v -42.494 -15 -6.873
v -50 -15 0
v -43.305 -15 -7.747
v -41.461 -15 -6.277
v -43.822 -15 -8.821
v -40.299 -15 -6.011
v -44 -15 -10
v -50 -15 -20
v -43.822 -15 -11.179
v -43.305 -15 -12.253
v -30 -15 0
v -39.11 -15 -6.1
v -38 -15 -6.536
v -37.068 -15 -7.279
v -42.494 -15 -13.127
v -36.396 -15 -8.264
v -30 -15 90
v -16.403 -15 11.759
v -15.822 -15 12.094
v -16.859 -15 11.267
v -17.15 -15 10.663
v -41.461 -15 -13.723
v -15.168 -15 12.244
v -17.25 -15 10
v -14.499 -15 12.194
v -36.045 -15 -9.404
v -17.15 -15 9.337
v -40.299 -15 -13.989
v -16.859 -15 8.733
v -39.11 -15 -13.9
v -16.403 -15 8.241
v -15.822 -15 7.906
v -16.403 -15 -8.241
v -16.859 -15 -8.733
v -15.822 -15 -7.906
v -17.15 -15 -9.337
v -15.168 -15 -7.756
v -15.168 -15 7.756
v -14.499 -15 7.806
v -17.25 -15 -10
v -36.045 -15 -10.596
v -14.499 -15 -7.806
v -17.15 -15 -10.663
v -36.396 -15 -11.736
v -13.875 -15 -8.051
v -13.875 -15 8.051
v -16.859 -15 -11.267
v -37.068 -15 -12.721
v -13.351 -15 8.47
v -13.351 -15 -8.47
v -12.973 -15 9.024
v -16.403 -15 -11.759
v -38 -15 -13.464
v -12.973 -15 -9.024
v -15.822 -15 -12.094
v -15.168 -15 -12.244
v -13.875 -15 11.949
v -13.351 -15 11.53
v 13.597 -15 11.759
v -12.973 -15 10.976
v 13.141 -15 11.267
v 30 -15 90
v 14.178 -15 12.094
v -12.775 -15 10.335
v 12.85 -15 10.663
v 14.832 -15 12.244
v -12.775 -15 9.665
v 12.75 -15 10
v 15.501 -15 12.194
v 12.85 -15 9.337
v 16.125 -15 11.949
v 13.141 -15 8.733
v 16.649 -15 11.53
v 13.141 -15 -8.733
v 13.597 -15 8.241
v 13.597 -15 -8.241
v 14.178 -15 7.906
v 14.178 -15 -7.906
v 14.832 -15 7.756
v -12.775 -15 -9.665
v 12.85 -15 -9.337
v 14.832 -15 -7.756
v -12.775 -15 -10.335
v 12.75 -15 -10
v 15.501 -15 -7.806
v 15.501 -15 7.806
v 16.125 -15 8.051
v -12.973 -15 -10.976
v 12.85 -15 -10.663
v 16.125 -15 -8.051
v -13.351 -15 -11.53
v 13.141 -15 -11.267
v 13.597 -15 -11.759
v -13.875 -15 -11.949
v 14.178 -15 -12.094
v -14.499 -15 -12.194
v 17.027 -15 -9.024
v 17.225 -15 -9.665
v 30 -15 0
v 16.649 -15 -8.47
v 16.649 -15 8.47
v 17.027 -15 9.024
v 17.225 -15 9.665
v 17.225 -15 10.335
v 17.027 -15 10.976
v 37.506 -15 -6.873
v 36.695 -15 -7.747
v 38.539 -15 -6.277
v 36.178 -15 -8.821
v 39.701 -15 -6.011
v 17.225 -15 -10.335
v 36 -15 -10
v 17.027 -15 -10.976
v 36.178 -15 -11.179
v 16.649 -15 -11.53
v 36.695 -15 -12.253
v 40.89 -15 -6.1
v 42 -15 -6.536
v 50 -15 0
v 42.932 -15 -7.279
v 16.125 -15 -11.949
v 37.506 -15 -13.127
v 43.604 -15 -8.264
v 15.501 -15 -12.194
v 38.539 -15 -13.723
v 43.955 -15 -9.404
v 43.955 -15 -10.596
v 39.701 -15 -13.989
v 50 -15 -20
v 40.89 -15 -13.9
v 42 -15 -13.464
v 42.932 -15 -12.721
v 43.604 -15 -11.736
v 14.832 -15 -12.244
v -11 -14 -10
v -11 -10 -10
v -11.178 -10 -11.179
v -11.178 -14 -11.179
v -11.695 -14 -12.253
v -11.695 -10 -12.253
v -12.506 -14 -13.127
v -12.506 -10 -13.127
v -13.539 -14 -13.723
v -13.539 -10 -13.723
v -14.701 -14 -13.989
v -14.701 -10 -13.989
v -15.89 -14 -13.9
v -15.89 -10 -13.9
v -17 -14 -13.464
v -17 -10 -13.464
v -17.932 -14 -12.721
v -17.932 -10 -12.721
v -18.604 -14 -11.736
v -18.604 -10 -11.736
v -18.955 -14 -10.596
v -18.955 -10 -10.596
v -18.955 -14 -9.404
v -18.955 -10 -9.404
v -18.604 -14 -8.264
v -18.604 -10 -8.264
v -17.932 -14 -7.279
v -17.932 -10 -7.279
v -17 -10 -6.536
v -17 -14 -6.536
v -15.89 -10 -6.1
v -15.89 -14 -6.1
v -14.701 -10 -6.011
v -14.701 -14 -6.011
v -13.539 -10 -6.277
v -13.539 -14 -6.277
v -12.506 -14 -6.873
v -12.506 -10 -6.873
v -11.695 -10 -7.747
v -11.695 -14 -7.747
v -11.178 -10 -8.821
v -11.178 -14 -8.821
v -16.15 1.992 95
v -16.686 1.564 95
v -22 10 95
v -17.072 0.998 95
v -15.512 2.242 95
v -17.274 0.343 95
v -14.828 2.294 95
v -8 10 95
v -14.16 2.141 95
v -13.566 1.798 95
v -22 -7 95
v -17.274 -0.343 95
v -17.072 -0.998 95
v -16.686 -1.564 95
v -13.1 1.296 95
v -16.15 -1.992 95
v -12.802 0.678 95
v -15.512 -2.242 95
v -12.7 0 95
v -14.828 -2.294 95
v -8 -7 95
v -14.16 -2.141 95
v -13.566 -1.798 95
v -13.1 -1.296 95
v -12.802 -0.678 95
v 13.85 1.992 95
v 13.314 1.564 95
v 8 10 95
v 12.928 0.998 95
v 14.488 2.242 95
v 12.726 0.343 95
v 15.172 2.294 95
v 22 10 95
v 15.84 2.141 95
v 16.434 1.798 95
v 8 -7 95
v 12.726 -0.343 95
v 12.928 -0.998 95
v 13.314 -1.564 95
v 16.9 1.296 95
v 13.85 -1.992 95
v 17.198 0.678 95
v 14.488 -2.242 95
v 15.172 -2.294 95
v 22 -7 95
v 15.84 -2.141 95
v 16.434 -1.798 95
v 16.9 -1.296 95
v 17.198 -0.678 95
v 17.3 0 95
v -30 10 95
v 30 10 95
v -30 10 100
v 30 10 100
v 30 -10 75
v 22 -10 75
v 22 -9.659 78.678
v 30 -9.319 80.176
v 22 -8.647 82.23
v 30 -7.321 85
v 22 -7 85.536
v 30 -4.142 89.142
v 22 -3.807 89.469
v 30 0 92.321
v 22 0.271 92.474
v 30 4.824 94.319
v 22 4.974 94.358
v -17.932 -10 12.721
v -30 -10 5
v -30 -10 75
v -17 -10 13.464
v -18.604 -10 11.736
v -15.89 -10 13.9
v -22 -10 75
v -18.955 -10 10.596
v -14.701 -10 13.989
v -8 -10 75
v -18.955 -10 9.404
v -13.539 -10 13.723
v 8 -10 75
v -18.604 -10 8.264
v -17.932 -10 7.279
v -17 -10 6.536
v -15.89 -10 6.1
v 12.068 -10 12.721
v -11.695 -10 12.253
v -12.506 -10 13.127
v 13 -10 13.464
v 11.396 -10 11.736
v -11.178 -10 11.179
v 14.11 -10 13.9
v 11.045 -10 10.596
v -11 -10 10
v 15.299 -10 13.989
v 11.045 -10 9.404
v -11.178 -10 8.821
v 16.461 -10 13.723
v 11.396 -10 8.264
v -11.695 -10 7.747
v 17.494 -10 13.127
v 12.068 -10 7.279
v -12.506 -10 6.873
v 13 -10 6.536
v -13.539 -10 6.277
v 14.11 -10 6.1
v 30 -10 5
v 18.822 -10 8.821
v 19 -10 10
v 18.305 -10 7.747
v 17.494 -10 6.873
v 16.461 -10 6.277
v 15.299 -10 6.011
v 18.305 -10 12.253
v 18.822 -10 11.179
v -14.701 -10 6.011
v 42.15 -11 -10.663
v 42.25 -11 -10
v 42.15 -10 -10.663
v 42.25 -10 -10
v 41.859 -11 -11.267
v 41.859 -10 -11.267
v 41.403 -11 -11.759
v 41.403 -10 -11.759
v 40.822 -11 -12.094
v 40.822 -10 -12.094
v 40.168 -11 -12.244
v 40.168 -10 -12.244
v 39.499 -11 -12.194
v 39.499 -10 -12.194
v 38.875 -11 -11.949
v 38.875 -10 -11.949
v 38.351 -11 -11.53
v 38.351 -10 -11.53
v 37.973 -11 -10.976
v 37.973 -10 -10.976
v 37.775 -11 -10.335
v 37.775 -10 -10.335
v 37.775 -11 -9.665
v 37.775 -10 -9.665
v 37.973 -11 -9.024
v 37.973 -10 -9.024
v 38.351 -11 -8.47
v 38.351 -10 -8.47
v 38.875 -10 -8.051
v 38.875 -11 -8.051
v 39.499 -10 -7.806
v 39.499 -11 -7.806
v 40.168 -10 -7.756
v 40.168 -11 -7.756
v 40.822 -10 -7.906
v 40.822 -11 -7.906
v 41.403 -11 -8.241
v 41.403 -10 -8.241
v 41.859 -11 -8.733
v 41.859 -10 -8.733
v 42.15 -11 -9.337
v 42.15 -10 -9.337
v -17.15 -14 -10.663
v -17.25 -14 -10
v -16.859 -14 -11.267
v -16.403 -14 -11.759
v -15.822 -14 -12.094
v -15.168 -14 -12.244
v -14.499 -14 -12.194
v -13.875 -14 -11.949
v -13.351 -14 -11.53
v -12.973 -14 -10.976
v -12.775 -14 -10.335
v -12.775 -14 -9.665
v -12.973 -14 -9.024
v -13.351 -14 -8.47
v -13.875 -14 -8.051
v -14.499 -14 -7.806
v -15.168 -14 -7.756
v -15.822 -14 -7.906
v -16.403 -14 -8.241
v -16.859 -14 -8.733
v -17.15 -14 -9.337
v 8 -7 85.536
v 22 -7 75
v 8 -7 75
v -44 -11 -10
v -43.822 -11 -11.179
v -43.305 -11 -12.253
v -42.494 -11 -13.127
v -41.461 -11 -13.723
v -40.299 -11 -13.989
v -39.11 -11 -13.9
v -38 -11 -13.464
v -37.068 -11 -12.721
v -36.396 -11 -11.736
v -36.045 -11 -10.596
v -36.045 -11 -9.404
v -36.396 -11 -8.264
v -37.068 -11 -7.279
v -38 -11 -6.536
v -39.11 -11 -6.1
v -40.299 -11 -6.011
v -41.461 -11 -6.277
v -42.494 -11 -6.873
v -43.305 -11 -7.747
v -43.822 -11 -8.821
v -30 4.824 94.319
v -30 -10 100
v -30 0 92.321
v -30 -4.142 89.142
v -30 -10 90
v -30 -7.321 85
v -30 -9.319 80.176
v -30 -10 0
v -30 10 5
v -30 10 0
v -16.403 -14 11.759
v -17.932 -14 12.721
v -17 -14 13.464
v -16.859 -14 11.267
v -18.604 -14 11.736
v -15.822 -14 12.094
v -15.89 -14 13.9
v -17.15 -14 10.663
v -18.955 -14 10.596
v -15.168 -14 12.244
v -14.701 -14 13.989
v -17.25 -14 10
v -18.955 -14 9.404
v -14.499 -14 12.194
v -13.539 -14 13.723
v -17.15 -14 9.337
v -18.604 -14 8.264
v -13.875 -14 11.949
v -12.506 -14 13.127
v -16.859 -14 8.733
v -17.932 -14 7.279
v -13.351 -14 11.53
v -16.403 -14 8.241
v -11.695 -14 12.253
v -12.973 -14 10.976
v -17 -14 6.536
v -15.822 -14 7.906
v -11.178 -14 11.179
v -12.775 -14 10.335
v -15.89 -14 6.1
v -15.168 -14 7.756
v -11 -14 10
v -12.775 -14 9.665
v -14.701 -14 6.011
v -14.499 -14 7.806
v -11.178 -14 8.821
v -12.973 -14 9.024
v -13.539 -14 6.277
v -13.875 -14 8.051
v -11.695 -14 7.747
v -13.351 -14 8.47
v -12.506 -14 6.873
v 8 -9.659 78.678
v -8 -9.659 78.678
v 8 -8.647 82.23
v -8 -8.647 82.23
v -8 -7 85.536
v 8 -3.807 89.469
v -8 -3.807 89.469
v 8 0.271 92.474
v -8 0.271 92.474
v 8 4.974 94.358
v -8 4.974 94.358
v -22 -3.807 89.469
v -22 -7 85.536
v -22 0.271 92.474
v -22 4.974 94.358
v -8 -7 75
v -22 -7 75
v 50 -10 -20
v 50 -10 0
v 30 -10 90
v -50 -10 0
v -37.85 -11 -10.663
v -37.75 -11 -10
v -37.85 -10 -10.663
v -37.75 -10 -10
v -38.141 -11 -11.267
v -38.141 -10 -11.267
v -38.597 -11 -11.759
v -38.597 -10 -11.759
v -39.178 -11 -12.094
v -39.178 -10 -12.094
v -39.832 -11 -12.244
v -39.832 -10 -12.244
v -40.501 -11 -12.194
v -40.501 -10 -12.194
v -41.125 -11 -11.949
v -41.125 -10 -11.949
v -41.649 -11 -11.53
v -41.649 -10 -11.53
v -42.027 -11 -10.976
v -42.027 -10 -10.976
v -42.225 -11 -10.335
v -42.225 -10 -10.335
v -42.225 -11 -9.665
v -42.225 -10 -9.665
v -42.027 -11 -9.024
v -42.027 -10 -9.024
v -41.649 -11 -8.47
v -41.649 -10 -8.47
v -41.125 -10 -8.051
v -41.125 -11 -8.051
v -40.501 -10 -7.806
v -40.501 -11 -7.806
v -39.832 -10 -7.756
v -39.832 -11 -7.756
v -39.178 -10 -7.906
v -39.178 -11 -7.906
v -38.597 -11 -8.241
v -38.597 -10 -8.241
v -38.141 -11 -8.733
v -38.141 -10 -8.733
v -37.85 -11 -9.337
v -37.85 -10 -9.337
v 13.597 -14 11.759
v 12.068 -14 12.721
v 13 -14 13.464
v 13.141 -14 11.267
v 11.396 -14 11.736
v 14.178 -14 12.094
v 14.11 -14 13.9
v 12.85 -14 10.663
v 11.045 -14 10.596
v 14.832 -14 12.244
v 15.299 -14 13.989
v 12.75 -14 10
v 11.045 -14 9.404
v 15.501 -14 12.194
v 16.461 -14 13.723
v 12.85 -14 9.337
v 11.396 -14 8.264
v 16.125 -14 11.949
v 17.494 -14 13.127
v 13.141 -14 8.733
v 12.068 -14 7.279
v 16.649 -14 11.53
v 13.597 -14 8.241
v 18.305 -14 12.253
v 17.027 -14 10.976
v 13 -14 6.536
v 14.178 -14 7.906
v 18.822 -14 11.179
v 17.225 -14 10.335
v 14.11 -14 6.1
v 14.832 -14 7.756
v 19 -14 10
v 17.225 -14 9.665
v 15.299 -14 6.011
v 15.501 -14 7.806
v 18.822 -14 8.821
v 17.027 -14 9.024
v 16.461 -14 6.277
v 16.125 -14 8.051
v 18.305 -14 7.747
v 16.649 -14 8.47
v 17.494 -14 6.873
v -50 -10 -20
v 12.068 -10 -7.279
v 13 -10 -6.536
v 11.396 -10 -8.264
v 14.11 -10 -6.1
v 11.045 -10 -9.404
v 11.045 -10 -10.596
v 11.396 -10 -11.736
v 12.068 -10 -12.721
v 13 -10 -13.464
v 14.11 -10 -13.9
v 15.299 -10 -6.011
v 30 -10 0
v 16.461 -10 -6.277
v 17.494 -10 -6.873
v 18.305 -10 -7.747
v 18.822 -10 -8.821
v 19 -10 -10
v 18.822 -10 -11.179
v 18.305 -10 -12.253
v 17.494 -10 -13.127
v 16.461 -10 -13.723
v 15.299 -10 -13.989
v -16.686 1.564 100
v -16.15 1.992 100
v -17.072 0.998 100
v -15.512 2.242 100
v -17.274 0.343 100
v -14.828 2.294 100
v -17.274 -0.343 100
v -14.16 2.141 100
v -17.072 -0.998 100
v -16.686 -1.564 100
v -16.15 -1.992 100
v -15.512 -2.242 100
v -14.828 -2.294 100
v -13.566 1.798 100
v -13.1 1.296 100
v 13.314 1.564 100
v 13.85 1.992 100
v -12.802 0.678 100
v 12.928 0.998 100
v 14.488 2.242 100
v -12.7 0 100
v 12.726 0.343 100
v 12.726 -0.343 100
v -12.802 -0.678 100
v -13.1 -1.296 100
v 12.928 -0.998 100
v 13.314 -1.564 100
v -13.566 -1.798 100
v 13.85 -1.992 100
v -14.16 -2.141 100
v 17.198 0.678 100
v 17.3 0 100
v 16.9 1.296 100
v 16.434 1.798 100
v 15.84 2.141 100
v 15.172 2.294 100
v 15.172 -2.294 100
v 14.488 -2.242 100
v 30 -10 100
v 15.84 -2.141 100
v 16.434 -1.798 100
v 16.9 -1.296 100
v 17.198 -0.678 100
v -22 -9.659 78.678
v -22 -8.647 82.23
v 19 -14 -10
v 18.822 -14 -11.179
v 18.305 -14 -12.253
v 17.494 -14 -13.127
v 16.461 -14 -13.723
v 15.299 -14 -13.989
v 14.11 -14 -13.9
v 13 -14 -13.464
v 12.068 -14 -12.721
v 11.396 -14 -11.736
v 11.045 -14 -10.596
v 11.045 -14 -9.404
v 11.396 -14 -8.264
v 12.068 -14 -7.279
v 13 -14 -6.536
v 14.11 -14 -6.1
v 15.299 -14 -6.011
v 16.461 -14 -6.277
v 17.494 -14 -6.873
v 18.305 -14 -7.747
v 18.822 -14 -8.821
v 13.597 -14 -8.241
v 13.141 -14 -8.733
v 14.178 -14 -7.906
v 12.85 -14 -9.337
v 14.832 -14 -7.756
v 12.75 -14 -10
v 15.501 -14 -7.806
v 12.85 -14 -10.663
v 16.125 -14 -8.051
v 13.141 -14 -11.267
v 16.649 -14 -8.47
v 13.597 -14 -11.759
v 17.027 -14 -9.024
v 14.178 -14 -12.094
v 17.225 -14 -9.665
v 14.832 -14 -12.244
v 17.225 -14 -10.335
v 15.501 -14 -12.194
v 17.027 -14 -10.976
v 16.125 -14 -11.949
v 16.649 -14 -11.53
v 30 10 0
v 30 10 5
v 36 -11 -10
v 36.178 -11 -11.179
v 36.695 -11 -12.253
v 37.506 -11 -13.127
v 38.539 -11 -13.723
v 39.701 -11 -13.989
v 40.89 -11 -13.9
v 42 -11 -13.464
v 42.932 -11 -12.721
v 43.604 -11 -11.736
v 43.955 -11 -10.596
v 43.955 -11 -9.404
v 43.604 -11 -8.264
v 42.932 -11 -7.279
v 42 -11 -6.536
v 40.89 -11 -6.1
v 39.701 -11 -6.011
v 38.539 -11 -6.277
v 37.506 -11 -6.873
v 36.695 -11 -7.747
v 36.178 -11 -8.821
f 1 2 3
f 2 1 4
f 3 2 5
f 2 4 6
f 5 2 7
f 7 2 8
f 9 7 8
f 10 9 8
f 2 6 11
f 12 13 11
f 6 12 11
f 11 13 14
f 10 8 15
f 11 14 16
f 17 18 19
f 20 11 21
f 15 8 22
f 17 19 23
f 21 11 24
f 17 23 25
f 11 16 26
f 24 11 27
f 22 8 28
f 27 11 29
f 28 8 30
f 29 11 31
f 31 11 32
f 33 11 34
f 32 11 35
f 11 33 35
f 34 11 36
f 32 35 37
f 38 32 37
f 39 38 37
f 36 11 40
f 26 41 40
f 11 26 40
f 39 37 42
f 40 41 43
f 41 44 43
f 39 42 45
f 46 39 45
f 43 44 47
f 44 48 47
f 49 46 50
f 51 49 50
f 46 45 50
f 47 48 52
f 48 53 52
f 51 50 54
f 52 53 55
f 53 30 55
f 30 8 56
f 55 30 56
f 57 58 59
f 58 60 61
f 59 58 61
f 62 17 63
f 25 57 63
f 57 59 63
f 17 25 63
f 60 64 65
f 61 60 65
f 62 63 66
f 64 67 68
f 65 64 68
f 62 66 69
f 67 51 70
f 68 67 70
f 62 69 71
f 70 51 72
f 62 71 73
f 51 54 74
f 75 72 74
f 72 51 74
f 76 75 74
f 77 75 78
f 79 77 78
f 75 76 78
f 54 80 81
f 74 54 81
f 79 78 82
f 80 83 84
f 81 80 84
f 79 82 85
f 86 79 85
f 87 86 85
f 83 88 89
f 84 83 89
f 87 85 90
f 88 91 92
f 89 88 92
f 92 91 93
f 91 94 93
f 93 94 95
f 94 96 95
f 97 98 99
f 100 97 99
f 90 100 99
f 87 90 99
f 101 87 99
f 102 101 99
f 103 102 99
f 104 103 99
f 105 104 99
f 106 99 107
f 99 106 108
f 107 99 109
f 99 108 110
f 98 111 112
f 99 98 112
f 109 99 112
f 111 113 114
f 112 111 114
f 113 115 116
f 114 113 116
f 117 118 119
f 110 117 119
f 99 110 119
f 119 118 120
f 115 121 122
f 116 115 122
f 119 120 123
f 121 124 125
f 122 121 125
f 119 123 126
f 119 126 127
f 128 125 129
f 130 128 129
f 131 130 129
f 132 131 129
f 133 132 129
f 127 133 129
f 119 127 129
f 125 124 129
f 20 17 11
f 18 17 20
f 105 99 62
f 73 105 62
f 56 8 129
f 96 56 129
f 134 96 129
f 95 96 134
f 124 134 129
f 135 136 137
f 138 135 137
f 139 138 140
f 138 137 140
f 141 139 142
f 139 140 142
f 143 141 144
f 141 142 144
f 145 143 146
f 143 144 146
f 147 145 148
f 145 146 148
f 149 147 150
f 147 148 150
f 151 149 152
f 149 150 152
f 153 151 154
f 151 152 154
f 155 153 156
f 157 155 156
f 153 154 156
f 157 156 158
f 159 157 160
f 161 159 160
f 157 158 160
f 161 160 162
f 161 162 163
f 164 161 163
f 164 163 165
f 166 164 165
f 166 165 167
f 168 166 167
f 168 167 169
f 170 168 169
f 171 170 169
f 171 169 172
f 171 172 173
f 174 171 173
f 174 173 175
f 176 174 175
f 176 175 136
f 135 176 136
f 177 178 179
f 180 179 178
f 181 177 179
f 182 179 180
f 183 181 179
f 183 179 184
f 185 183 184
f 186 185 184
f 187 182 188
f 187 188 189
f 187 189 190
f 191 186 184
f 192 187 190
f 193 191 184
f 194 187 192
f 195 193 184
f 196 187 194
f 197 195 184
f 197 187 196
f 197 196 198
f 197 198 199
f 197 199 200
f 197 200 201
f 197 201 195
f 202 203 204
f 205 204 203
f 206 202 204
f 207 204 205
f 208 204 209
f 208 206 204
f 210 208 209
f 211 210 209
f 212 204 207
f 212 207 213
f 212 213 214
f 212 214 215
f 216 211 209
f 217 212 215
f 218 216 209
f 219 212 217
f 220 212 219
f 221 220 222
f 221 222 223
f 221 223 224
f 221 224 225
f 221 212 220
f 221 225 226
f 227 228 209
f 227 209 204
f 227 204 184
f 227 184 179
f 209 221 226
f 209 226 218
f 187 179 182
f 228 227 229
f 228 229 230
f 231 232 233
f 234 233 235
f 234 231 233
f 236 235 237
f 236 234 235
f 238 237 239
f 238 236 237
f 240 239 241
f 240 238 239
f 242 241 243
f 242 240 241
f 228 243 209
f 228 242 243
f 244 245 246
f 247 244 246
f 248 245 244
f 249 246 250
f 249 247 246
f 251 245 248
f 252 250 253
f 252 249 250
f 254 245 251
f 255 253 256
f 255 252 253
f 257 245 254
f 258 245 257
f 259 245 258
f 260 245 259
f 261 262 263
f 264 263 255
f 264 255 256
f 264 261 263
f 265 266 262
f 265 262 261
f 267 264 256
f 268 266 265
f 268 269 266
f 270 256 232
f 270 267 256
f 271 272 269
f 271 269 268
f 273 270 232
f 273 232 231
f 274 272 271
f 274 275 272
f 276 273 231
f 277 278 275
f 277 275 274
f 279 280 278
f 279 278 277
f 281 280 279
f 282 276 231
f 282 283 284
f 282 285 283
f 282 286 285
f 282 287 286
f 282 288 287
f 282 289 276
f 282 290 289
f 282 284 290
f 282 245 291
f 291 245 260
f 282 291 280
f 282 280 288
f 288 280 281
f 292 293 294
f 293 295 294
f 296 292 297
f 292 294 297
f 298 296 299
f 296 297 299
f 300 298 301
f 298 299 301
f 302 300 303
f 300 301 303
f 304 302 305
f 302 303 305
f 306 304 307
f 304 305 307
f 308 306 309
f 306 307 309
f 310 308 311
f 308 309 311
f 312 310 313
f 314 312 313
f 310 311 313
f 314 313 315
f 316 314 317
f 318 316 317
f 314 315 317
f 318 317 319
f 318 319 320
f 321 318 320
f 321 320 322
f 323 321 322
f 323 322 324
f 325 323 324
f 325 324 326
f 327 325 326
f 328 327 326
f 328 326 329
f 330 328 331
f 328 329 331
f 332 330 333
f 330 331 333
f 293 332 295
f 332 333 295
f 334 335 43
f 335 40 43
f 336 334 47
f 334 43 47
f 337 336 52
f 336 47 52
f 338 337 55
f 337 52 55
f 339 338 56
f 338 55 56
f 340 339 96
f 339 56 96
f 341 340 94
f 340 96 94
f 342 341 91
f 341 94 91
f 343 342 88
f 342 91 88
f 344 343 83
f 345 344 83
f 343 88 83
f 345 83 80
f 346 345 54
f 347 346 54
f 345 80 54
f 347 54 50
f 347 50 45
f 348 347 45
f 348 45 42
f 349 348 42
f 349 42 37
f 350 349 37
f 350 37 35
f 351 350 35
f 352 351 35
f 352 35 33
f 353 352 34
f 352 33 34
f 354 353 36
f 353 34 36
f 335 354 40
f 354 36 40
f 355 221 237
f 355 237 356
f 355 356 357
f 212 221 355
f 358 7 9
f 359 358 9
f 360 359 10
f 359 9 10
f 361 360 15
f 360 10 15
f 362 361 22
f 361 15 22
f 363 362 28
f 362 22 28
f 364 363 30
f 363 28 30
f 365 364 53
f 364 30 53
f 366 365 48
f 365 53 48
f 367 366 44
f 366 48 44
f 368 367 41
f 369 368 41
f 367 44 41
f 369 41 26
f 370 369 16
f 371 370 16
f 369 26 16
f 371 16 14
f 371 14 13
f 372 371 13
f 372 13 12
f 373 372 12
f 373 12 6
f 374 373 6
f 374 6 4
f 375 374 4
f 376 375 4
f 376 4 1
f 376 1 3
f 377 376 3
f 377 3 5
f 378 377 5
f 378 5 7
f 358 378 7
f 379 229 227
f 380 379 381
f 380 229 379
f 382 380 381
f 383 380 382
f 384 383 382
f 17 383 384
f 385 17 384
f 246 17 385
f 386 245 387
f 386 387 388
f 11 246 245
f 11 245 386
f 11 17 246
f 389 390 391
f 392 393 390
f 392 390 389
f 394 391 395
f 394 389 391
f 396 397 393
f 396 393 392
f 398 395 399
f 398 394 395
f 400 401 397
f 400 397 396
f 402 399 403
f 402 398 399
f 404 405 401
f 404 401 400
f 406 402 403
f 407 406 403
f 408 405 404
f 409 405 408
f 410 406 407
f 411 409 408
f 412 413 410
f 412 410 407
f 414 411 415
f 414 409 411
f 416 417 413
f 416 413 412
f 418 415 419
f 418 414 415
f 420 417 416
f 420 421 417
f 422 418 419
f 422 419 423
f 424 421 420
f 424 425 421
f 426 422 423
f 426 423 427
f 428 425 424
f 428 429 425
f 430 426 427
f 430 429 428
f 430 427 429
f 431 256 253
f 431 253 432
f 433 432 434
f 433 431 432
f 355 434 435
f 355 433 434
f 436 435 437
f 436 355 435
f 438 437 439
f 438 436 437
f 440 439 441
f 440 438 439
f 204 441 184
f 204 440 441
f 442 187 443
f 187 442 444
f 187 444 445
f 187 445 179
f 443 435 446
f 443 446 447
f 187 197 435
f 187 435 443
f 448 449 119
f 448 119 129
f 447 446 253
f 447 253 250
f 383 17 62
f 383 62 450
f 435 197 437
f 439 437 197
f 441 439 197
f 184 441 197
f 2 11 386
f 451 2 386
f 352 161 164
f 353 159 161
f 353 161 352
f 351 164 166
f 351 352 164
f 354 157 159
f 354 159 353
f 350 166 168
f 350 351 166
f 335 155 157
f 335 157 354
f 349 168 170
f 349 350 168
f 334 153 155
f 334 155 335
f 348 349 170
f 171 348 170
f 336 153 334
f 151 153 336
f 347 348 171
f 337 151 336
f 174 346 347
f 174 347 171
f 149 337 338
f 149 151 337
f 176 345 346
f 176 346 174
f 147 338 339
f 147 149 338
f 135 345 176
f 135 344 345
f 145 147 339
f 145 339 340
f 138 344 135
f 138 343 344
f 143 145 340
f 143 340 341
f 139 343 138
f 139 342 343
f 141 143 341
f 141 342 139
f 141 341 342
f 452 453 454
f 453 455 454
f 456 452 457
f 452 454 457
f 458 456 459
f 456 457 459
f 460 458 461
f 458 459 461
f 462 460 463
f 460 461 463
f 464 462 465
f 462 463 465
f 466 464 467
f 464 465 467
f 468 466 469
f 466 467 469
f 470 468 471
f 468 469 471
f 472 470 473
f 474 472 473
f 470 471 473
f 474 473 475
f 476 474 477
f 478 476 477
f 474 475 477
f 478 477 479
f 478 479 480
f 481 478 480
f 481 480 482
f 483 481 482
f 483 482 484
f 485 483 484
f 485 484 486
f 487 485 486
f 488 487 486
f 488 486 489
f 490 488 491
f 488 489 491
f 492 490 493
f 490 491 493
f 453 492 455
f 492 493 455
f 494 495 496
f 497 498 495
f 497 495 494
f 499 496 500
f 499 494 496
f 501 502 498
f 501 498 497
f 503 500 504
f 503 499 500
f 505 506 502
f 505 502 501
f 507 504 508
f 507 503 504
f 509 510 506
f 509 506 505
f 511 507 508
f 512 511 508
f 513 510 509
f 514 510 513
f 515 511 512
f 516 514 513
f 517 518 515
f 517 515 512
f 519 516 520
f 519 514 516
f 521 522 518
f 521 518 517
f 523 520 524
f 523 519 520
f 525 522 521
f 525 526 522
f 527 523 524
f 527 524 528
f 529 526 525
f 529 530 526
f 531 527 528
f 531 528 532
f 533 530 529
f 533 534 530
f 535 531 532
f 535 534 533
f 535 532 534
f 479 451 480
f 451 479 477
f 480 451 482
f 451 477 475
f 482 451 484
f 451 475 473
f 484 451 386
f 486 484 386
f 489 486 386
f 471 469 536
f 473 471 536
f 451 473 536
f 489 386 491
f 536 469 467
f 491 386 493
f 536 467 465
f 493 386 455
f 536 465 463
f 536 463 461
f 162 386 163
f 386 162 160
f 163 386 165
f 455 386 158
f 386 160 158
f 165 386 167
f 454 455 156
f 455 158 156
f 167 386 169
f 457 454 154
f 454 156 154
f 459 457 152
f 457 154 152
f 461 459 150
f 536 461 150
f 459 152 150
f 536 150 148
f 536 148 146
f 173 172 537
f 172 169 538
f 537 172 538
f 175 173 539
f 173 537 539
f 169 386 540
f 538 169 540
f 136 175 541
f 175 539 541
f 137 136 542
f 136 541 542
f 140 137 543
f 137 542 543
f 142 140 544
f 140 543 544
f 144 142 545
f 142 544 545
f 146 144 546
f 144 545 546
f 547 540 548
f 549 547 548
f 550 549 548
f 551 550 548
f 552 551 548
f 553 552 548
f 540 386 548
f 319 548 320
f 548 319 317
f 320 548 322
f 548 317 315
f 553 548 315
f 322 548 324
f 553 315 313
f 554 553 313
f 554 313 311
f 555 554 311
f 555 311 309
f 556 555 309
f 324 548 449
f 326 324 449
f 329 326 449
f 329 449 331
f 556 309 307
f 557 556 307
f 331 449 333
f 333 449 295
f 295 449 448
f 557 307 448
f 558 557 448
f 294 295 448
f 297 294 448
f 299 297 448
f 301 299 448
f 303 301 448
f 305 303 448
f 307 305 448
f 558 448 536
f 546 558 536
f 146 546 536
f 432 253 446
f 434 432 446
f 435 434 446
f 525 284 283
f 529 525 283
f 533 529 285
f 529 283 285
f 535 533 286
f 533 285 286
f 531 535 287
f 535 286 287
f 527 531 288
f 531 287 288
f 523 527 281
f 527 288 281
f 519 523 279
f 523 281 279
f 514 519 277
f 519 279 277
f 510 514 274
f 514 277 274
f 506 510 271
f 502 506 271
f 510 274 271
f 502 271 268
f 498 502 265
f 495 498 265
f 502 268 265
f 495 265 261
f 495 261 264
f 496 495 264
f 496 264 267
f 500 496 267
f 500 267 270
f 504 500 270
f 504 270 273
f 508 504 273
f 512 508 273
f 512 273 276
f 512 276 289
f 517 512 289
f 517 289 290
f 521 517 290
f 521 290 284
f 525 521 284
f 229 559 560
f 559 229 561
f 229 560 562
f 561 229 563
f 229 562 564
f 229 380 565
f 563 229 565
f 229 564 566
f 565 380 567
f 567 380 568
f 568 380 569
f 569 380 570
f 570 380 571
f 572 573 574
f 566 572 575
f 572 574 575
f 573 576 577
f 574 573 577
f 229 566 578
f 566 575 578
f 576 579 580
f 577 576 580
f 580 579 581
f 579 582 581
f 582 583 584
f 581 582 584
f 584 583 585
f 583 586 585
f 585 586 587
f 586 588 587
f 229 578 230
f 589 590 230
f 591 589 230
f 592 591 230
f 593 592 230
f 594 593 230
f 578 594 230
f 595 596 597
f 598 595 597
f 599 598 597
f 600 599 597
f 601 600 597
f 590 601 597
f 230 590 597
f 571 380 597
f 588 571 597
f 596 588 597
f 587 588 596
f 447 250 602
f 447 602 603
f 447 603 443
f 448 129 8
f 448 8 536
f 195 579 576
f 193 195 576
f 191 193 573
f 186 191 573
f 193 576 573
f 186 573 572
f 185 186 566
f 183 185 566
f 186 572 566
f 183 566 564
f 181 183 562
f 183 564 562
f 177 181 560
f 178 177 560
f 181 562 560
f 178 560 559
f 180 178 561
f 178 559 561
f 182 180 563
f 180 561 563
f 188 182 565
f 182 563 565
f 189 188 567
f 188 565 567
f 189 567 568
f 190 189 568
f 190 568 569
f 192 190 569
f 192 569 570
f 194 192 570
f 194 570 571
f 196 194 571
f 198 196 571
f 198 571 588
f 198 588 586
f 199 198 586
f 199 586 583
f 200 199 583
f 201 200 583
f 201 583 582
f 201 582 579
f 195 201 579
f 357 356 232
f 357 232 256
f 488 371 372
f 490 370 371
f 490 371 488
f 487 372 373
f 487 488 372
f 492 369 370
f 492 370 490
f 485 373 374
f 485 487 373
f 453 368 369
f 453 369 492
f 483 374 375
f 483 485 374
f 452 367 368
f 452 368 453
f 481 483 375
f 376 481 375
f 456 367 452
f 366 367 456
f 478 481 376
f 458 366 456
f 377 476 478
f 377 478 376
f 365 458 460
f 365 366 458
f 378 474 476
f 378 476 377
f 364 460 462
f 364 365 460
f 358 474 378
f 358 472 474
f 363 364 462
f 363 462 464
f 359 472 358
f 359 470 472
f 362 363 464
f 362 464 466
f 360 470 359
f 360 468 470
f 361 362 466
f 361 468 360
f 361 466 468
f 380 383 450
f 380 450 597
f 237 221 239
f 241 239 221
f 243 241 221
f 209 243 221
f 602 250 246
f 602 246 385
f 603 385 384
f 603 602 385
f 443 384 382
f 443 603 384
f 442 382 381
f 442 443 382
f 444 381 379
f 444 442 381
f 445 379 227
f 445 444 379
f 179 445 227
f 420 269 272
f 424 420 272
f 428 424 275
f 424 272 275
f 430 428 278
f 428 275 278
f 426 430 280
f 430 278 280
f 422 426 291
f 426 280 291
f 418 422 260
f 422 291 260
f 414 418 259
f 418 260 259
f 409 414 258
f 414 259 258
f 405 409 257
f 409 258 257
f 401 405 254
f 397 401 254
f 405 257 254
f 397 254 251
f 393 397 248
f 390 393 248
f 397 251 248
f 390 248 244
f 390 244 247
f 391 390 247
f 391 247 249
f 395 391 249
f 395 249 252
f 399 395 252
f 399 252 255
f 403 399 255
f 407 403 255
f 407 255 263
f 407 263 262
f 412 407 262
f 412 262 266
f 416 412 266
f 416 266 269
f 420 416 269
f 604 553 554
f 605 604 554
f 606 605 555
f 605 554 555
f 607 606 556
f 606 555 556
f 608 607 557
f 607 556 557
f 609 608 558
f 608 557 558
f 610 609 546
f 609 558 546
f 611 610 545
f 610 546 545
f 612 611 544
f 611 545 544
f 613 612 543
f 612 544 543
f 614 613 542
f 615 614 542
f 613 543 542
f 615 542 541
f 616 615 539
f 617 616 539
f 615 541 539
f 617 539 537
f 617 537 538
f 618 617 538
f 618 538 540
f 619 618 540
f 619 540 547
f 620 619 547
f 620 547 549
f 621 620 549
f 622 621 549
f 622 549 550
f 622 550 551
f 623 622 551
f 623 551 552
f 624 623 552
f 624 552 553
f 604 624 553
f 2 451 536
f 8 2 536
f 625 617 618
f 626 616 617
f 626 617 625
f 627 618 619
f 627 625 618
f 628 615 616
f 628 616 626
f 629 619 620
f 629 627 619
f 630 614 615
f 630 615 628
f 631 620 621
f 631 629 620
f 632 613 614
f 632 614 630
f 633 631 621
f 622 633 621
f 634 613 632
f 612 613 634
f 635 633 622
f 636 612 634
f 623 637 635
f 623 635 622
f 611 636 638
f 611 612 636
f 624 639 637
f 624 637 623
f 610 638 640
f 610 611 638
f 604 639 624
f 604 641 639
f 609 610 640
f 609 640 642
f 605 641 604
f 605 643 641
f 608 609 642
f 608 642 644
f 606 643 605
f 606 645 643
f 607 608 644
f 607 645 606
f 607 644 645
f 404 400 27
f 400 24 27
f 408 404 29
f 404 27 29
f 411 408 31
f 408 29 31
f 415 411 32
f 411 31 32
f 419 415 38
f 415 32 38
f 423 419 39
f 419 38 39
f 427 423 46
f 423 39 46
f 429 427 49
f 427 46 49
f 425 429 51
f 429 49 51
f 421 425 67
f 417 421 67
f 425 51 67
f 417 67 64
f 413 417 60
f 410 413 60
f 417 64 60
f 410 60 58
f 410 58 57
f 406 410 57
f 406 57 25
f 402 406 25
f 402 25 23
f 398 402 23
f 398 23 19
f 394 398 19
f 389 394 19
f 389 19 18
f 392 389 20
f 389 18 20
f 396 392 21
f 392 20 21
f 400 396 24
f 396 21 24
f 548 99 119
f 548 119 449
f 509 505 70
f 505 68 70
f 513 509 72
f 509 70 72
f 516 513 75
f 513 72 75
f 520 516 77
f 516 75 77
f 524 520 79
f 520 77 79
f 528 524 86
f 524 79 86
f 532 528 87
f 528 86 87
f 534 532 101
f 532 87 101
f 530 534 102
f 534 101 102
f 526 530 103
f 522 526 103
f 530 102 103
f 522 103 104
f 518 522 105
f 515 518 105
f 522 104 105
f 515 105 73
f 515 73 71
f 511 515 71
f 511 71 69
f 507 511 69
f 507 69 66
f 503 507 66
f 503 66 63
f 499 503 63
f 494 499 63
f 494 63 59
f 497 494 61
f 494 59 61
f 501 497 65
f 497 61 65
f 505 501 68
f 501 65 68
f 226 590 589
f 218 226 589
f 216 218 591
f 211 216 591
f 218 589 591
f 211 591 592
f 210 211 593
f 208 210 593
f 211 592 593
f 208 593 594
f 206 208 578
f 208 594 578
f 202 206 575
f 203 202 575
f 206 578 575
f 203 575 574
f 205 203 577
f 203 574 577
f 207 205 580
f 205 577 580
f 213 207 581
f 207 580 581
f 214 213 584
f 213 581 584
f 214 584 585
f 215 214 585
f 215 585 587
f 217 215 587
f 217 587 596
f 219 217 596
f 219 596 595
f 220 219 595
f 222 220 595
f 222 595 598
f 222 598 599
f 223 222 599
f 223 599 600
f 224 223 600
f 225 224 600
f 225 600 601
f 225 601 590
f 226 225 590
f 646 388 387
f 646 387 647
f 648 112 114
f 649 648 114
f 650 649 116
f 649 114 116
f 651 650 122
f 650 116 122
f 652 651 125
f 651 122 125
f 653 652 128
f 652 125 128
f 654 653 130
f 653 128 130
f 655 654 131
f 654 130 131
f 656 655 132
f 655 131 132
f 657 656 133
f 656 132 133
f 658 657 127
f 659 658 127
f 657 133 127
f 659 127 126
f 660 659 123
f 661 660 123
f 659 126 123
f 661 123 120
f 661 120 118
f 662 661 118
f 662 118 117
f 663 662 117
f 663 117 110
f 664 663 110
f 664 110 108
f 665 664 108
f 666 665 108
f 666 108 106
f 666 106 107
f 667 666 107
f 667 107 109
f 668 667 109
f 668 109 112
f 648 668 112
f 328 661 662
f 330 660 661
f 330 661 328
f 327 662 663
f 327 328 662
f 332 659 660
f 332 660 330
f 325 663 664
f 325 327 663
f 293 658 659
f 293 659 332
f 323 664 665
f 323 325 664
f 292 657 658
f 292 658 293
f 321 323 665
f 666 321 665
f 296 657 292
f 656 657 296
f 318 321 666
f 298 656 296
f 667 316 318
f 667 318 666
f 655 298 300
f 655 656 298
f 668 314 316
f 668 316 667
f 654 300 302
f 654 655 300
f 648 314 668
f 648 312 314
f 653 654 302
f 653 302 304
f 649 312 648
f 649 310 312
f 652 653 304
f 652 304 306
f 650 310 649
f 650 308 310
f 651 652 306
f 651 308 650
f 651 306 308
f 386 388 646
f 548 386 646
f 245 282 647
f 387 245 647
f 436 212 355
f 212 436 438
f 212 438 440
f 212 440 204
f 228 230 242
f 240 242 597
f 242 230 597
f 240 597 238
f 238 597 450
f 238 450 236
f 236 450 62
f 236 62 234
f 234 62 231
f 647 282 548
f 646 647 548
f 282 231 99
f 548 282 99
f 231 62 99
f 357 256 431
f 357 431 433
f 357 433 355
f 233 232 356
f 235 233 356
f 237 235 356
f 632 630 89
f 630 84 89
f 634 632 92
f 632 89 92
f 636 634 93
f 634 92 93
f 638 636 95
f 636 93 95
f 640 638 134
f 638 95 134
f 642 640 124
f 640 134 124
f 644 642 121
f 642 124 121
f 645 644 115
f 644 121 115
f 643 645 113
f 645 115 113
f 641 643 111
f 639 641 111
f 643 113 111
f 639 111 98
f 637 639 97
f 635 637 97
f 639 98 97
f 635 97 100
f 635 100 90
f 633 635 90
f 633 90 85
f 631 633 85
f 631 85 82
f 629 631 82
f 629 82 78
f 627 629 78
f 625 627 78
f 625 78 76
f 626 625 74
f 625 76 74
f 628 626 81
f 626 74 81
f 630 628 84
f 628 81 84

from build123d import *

# Parameters (mm, degrees)
SKETCH_1_W                   = 60
SKETCH_1_H                   = 20
EXTRUDE_1_DEPTH              = 20
SKETCH_2_W                   = 60
SKETCH_2_H                   = 40
EXTRUDE_2_DEPTH              = 5
SKETCH_3_W                   = 20
SKETCH_3_H                   = 5
EXTRUDE_3_DEPTH              = 20
HOLE_WIZARD_M4_2_D           = 4.5
HOLE_WIZARD_M4_2_CBORE_D     = 8
HOLE_WIZARD_M4_2_CBORE_DEPTH = 4
SKETCH_8_W                   = 15
SKETCH_8_H                   = 20
CUT_EXTRUDE_1_DEPTH          = 84.815273071
HOLE_WIZARD_M4_1_D           = 4.5
HOLE_WIZARD_M4_1_CBORE_D     = 8
HOLE_WIZARD_M4_1_CBORE_DEPTH = 4
SKETCH_10_W                  = 60
SKETCH_10_H                  = 5
EXTRUDE_4_DEPTH              = 80
SKETCH_11_W                  = 60
SKETCH_11_H                  = 5
EXTRUDE_5_DEPTH              = 20
FILLET_1_R                   = 20
SKETCH_12_W                  = 10
SKETCH_12_H                  = 5
CUT_EXTRUDE_2_DEPTH          = 129.937969582
SKETCH_13_W                  = 14
SKETCH_13_H                  = 20
CUT_EXTRUDE_3_DEPTH          = 35
SKETCH_14_W                  = 14
SKETCH_14_H                  = 3
EXTRUDE_6_DEPTH              = 20
HOLE_WIZARD_M4_1_2_D         = 4.6
HOLE_WIZARD_M4_1_2_DEPTH     = 5


with BuildPart() as part:
    # 스케치1 → 보스-돌출1 (new body)
    with BuildSketch(Plane.XY):
        Rectangle(SKETCH_1_W, SKETCH_1_H)
    extrude(amount=EXTRUDE_1_DEPTH)

    # 스케치2 → 보스-돌출2 (add)
    with BuildSketch(Plane.XZ.offset(10)):
        Rectangle(SKETCH_2_W, SKETCH_2_H)
    extrude(amount=EXTRUDE_2_DEPTH)

    # 스케치3 → 보스-돌출3 (add)
    with BuildSketch(Plane(origin=(30, 0, 0), x_dir=(0, 0, -1), z_dir=(1, 0, 0))):
        with Locations((10, -12.5)):
            Rectangle(SKETCH_3_W, SKETCH_3_H)
    extrude_3 = extrude(amount=EXTRUDE_3_DEPTH)

    # 대칭 복사1: 보스-돌출3 across plane
    add(extrude_3.mirror(Plane.ZY))

    # M4 소켓 머리 캡 나사용 카운터보어2 (through all)
    with Locations(Plane(origin=(0, -15, 0), x_dir=(-1, 0, 0), z_dir=(0, -1, 0))):
        with Locations((40, 10), (-40, 10)):
            CounterBoreHole(HOLE_WIZARD_M4_2_D / 2, HOLE_WIZARD_M4_2_CBORE_D / 2, HOLE_WIZARD_M4_2_CBORE_DEPTH)

    # 스케치8 → 컷-돌출1 (cut, through all)
    with BuildSketch(Plane(origin=(30, 0, 0), x_dir=(0, 0, -1), z_dir=(1, 0, 0))):
        with Locations((-12.5, 0)):
            Rectangle(SKETCH_8_W, SKETCH_8_H)
    extrude(amount=-CUT_EXTRUDE_1_DEPTH, mode=Mode.SUBTRACT)

    # Hole Wizard M4 _ _ _ _ _1 (through all)
    with Locations(Plane(origin=(0, -10, 0), x_dir=(1, 0, 0), z_dir=(0, 1, 0))):
        with Locations((-15, 10), (15, 10), (-15, -10), (15, -10)):
            CounterBoreHole(HOLE_WIZARD_M4_1_D / 2, HOLE_WIZARD_M4_1_CBORE_D / 2, HOLE_WIZARD_M4_1_CBORE_DEPTH)

    # 스케치10 → 보스-돌출4 (add)
    with BuildSketch(Plane.XY.offset(20)):
        with Locations((0, -12.5)):
            Rectangle(SKETCH_10_W, SKETCH_10_H)
    extrude(amount=EXTRUDE_4_DEPTH)

    # 스케치11 → 보스-돌출5 (add)
    with BuildSketch(Plane(origin=(0, -10, 0), x_dir=(1, 0, 0), z_dir=(0, 1, 0))):
        with Locations((0, -97.5)):
            Rectangle(SKETCH_11_W, SKETCH_11_H)
    extrude(amount=EXTRUDE_5_DEPTH)

    # 필렛1
    fillet_1_edges = [part.edges().sort_by_distance(p)[0] for p in [
        (0, -10, 95),
    ]]
    fillet(fillet_1_edges, radius=FILLET_1_R - 0.0001)  # a hair under: the kernel refuses the full size

    # 스케치12 → 컷-돌출2 (cut, through all)
    with BuildSketch(Plane.ZY.offset(30)):
        with Locations((95, -12.5)):
            Rectangle(SKETCH_12_W, SKETCH_12_H)
    extrude(amount=-CUT_EXTRUDE_2_DEPTH, mode=Mode.SUBTRACT)

    # 스케치13 → 컷-돌출3 (cut)
    with BuildSketch(Plane.XY.offset(60)):
        with Locations((-15, 0)):
            Rectangle(SKETCH_13_W, SKETCH_13_H)
        with Locations((15, 0)):
            Rectangle(SKETCH_13_W, SKETCH_13_H)
    extrude(amount=CUT_EXTRUDE_3_DEPTH, mode=Mode.SUBTRACT)

    # 스케치14 → 보스-돌출6 (add)
    with BuildSketch(Plane(origin=(0, 0, 95), x_dir=(-1, 0, 0), z_dir=(0, 0, -1))):
        with Locations((-15, -8.5)):
            Rectangle(SKETCH_14_W, SKETCH_14_H)
        with Locations((15, -8.5)):
            Rectangle(SKETCH_14_W, SKETCH_14_H)
    extrude(amount=EXTRUDE_6_DEPTH)

    # Hole Wizard M4 _ _1 2
    with Locations(Plane(origin=(0, 0, 95), x_dir=(-1, 0, 0), z_dir=(0, 0, -1))):
        with Locations((-15, 0), (15, 0)):
            Hole(HOLE_WIZARD_M4_1_2_D / 2, depth=HOLE_WIZARD_M4_1_2_DEPTH)


solid = part.part
